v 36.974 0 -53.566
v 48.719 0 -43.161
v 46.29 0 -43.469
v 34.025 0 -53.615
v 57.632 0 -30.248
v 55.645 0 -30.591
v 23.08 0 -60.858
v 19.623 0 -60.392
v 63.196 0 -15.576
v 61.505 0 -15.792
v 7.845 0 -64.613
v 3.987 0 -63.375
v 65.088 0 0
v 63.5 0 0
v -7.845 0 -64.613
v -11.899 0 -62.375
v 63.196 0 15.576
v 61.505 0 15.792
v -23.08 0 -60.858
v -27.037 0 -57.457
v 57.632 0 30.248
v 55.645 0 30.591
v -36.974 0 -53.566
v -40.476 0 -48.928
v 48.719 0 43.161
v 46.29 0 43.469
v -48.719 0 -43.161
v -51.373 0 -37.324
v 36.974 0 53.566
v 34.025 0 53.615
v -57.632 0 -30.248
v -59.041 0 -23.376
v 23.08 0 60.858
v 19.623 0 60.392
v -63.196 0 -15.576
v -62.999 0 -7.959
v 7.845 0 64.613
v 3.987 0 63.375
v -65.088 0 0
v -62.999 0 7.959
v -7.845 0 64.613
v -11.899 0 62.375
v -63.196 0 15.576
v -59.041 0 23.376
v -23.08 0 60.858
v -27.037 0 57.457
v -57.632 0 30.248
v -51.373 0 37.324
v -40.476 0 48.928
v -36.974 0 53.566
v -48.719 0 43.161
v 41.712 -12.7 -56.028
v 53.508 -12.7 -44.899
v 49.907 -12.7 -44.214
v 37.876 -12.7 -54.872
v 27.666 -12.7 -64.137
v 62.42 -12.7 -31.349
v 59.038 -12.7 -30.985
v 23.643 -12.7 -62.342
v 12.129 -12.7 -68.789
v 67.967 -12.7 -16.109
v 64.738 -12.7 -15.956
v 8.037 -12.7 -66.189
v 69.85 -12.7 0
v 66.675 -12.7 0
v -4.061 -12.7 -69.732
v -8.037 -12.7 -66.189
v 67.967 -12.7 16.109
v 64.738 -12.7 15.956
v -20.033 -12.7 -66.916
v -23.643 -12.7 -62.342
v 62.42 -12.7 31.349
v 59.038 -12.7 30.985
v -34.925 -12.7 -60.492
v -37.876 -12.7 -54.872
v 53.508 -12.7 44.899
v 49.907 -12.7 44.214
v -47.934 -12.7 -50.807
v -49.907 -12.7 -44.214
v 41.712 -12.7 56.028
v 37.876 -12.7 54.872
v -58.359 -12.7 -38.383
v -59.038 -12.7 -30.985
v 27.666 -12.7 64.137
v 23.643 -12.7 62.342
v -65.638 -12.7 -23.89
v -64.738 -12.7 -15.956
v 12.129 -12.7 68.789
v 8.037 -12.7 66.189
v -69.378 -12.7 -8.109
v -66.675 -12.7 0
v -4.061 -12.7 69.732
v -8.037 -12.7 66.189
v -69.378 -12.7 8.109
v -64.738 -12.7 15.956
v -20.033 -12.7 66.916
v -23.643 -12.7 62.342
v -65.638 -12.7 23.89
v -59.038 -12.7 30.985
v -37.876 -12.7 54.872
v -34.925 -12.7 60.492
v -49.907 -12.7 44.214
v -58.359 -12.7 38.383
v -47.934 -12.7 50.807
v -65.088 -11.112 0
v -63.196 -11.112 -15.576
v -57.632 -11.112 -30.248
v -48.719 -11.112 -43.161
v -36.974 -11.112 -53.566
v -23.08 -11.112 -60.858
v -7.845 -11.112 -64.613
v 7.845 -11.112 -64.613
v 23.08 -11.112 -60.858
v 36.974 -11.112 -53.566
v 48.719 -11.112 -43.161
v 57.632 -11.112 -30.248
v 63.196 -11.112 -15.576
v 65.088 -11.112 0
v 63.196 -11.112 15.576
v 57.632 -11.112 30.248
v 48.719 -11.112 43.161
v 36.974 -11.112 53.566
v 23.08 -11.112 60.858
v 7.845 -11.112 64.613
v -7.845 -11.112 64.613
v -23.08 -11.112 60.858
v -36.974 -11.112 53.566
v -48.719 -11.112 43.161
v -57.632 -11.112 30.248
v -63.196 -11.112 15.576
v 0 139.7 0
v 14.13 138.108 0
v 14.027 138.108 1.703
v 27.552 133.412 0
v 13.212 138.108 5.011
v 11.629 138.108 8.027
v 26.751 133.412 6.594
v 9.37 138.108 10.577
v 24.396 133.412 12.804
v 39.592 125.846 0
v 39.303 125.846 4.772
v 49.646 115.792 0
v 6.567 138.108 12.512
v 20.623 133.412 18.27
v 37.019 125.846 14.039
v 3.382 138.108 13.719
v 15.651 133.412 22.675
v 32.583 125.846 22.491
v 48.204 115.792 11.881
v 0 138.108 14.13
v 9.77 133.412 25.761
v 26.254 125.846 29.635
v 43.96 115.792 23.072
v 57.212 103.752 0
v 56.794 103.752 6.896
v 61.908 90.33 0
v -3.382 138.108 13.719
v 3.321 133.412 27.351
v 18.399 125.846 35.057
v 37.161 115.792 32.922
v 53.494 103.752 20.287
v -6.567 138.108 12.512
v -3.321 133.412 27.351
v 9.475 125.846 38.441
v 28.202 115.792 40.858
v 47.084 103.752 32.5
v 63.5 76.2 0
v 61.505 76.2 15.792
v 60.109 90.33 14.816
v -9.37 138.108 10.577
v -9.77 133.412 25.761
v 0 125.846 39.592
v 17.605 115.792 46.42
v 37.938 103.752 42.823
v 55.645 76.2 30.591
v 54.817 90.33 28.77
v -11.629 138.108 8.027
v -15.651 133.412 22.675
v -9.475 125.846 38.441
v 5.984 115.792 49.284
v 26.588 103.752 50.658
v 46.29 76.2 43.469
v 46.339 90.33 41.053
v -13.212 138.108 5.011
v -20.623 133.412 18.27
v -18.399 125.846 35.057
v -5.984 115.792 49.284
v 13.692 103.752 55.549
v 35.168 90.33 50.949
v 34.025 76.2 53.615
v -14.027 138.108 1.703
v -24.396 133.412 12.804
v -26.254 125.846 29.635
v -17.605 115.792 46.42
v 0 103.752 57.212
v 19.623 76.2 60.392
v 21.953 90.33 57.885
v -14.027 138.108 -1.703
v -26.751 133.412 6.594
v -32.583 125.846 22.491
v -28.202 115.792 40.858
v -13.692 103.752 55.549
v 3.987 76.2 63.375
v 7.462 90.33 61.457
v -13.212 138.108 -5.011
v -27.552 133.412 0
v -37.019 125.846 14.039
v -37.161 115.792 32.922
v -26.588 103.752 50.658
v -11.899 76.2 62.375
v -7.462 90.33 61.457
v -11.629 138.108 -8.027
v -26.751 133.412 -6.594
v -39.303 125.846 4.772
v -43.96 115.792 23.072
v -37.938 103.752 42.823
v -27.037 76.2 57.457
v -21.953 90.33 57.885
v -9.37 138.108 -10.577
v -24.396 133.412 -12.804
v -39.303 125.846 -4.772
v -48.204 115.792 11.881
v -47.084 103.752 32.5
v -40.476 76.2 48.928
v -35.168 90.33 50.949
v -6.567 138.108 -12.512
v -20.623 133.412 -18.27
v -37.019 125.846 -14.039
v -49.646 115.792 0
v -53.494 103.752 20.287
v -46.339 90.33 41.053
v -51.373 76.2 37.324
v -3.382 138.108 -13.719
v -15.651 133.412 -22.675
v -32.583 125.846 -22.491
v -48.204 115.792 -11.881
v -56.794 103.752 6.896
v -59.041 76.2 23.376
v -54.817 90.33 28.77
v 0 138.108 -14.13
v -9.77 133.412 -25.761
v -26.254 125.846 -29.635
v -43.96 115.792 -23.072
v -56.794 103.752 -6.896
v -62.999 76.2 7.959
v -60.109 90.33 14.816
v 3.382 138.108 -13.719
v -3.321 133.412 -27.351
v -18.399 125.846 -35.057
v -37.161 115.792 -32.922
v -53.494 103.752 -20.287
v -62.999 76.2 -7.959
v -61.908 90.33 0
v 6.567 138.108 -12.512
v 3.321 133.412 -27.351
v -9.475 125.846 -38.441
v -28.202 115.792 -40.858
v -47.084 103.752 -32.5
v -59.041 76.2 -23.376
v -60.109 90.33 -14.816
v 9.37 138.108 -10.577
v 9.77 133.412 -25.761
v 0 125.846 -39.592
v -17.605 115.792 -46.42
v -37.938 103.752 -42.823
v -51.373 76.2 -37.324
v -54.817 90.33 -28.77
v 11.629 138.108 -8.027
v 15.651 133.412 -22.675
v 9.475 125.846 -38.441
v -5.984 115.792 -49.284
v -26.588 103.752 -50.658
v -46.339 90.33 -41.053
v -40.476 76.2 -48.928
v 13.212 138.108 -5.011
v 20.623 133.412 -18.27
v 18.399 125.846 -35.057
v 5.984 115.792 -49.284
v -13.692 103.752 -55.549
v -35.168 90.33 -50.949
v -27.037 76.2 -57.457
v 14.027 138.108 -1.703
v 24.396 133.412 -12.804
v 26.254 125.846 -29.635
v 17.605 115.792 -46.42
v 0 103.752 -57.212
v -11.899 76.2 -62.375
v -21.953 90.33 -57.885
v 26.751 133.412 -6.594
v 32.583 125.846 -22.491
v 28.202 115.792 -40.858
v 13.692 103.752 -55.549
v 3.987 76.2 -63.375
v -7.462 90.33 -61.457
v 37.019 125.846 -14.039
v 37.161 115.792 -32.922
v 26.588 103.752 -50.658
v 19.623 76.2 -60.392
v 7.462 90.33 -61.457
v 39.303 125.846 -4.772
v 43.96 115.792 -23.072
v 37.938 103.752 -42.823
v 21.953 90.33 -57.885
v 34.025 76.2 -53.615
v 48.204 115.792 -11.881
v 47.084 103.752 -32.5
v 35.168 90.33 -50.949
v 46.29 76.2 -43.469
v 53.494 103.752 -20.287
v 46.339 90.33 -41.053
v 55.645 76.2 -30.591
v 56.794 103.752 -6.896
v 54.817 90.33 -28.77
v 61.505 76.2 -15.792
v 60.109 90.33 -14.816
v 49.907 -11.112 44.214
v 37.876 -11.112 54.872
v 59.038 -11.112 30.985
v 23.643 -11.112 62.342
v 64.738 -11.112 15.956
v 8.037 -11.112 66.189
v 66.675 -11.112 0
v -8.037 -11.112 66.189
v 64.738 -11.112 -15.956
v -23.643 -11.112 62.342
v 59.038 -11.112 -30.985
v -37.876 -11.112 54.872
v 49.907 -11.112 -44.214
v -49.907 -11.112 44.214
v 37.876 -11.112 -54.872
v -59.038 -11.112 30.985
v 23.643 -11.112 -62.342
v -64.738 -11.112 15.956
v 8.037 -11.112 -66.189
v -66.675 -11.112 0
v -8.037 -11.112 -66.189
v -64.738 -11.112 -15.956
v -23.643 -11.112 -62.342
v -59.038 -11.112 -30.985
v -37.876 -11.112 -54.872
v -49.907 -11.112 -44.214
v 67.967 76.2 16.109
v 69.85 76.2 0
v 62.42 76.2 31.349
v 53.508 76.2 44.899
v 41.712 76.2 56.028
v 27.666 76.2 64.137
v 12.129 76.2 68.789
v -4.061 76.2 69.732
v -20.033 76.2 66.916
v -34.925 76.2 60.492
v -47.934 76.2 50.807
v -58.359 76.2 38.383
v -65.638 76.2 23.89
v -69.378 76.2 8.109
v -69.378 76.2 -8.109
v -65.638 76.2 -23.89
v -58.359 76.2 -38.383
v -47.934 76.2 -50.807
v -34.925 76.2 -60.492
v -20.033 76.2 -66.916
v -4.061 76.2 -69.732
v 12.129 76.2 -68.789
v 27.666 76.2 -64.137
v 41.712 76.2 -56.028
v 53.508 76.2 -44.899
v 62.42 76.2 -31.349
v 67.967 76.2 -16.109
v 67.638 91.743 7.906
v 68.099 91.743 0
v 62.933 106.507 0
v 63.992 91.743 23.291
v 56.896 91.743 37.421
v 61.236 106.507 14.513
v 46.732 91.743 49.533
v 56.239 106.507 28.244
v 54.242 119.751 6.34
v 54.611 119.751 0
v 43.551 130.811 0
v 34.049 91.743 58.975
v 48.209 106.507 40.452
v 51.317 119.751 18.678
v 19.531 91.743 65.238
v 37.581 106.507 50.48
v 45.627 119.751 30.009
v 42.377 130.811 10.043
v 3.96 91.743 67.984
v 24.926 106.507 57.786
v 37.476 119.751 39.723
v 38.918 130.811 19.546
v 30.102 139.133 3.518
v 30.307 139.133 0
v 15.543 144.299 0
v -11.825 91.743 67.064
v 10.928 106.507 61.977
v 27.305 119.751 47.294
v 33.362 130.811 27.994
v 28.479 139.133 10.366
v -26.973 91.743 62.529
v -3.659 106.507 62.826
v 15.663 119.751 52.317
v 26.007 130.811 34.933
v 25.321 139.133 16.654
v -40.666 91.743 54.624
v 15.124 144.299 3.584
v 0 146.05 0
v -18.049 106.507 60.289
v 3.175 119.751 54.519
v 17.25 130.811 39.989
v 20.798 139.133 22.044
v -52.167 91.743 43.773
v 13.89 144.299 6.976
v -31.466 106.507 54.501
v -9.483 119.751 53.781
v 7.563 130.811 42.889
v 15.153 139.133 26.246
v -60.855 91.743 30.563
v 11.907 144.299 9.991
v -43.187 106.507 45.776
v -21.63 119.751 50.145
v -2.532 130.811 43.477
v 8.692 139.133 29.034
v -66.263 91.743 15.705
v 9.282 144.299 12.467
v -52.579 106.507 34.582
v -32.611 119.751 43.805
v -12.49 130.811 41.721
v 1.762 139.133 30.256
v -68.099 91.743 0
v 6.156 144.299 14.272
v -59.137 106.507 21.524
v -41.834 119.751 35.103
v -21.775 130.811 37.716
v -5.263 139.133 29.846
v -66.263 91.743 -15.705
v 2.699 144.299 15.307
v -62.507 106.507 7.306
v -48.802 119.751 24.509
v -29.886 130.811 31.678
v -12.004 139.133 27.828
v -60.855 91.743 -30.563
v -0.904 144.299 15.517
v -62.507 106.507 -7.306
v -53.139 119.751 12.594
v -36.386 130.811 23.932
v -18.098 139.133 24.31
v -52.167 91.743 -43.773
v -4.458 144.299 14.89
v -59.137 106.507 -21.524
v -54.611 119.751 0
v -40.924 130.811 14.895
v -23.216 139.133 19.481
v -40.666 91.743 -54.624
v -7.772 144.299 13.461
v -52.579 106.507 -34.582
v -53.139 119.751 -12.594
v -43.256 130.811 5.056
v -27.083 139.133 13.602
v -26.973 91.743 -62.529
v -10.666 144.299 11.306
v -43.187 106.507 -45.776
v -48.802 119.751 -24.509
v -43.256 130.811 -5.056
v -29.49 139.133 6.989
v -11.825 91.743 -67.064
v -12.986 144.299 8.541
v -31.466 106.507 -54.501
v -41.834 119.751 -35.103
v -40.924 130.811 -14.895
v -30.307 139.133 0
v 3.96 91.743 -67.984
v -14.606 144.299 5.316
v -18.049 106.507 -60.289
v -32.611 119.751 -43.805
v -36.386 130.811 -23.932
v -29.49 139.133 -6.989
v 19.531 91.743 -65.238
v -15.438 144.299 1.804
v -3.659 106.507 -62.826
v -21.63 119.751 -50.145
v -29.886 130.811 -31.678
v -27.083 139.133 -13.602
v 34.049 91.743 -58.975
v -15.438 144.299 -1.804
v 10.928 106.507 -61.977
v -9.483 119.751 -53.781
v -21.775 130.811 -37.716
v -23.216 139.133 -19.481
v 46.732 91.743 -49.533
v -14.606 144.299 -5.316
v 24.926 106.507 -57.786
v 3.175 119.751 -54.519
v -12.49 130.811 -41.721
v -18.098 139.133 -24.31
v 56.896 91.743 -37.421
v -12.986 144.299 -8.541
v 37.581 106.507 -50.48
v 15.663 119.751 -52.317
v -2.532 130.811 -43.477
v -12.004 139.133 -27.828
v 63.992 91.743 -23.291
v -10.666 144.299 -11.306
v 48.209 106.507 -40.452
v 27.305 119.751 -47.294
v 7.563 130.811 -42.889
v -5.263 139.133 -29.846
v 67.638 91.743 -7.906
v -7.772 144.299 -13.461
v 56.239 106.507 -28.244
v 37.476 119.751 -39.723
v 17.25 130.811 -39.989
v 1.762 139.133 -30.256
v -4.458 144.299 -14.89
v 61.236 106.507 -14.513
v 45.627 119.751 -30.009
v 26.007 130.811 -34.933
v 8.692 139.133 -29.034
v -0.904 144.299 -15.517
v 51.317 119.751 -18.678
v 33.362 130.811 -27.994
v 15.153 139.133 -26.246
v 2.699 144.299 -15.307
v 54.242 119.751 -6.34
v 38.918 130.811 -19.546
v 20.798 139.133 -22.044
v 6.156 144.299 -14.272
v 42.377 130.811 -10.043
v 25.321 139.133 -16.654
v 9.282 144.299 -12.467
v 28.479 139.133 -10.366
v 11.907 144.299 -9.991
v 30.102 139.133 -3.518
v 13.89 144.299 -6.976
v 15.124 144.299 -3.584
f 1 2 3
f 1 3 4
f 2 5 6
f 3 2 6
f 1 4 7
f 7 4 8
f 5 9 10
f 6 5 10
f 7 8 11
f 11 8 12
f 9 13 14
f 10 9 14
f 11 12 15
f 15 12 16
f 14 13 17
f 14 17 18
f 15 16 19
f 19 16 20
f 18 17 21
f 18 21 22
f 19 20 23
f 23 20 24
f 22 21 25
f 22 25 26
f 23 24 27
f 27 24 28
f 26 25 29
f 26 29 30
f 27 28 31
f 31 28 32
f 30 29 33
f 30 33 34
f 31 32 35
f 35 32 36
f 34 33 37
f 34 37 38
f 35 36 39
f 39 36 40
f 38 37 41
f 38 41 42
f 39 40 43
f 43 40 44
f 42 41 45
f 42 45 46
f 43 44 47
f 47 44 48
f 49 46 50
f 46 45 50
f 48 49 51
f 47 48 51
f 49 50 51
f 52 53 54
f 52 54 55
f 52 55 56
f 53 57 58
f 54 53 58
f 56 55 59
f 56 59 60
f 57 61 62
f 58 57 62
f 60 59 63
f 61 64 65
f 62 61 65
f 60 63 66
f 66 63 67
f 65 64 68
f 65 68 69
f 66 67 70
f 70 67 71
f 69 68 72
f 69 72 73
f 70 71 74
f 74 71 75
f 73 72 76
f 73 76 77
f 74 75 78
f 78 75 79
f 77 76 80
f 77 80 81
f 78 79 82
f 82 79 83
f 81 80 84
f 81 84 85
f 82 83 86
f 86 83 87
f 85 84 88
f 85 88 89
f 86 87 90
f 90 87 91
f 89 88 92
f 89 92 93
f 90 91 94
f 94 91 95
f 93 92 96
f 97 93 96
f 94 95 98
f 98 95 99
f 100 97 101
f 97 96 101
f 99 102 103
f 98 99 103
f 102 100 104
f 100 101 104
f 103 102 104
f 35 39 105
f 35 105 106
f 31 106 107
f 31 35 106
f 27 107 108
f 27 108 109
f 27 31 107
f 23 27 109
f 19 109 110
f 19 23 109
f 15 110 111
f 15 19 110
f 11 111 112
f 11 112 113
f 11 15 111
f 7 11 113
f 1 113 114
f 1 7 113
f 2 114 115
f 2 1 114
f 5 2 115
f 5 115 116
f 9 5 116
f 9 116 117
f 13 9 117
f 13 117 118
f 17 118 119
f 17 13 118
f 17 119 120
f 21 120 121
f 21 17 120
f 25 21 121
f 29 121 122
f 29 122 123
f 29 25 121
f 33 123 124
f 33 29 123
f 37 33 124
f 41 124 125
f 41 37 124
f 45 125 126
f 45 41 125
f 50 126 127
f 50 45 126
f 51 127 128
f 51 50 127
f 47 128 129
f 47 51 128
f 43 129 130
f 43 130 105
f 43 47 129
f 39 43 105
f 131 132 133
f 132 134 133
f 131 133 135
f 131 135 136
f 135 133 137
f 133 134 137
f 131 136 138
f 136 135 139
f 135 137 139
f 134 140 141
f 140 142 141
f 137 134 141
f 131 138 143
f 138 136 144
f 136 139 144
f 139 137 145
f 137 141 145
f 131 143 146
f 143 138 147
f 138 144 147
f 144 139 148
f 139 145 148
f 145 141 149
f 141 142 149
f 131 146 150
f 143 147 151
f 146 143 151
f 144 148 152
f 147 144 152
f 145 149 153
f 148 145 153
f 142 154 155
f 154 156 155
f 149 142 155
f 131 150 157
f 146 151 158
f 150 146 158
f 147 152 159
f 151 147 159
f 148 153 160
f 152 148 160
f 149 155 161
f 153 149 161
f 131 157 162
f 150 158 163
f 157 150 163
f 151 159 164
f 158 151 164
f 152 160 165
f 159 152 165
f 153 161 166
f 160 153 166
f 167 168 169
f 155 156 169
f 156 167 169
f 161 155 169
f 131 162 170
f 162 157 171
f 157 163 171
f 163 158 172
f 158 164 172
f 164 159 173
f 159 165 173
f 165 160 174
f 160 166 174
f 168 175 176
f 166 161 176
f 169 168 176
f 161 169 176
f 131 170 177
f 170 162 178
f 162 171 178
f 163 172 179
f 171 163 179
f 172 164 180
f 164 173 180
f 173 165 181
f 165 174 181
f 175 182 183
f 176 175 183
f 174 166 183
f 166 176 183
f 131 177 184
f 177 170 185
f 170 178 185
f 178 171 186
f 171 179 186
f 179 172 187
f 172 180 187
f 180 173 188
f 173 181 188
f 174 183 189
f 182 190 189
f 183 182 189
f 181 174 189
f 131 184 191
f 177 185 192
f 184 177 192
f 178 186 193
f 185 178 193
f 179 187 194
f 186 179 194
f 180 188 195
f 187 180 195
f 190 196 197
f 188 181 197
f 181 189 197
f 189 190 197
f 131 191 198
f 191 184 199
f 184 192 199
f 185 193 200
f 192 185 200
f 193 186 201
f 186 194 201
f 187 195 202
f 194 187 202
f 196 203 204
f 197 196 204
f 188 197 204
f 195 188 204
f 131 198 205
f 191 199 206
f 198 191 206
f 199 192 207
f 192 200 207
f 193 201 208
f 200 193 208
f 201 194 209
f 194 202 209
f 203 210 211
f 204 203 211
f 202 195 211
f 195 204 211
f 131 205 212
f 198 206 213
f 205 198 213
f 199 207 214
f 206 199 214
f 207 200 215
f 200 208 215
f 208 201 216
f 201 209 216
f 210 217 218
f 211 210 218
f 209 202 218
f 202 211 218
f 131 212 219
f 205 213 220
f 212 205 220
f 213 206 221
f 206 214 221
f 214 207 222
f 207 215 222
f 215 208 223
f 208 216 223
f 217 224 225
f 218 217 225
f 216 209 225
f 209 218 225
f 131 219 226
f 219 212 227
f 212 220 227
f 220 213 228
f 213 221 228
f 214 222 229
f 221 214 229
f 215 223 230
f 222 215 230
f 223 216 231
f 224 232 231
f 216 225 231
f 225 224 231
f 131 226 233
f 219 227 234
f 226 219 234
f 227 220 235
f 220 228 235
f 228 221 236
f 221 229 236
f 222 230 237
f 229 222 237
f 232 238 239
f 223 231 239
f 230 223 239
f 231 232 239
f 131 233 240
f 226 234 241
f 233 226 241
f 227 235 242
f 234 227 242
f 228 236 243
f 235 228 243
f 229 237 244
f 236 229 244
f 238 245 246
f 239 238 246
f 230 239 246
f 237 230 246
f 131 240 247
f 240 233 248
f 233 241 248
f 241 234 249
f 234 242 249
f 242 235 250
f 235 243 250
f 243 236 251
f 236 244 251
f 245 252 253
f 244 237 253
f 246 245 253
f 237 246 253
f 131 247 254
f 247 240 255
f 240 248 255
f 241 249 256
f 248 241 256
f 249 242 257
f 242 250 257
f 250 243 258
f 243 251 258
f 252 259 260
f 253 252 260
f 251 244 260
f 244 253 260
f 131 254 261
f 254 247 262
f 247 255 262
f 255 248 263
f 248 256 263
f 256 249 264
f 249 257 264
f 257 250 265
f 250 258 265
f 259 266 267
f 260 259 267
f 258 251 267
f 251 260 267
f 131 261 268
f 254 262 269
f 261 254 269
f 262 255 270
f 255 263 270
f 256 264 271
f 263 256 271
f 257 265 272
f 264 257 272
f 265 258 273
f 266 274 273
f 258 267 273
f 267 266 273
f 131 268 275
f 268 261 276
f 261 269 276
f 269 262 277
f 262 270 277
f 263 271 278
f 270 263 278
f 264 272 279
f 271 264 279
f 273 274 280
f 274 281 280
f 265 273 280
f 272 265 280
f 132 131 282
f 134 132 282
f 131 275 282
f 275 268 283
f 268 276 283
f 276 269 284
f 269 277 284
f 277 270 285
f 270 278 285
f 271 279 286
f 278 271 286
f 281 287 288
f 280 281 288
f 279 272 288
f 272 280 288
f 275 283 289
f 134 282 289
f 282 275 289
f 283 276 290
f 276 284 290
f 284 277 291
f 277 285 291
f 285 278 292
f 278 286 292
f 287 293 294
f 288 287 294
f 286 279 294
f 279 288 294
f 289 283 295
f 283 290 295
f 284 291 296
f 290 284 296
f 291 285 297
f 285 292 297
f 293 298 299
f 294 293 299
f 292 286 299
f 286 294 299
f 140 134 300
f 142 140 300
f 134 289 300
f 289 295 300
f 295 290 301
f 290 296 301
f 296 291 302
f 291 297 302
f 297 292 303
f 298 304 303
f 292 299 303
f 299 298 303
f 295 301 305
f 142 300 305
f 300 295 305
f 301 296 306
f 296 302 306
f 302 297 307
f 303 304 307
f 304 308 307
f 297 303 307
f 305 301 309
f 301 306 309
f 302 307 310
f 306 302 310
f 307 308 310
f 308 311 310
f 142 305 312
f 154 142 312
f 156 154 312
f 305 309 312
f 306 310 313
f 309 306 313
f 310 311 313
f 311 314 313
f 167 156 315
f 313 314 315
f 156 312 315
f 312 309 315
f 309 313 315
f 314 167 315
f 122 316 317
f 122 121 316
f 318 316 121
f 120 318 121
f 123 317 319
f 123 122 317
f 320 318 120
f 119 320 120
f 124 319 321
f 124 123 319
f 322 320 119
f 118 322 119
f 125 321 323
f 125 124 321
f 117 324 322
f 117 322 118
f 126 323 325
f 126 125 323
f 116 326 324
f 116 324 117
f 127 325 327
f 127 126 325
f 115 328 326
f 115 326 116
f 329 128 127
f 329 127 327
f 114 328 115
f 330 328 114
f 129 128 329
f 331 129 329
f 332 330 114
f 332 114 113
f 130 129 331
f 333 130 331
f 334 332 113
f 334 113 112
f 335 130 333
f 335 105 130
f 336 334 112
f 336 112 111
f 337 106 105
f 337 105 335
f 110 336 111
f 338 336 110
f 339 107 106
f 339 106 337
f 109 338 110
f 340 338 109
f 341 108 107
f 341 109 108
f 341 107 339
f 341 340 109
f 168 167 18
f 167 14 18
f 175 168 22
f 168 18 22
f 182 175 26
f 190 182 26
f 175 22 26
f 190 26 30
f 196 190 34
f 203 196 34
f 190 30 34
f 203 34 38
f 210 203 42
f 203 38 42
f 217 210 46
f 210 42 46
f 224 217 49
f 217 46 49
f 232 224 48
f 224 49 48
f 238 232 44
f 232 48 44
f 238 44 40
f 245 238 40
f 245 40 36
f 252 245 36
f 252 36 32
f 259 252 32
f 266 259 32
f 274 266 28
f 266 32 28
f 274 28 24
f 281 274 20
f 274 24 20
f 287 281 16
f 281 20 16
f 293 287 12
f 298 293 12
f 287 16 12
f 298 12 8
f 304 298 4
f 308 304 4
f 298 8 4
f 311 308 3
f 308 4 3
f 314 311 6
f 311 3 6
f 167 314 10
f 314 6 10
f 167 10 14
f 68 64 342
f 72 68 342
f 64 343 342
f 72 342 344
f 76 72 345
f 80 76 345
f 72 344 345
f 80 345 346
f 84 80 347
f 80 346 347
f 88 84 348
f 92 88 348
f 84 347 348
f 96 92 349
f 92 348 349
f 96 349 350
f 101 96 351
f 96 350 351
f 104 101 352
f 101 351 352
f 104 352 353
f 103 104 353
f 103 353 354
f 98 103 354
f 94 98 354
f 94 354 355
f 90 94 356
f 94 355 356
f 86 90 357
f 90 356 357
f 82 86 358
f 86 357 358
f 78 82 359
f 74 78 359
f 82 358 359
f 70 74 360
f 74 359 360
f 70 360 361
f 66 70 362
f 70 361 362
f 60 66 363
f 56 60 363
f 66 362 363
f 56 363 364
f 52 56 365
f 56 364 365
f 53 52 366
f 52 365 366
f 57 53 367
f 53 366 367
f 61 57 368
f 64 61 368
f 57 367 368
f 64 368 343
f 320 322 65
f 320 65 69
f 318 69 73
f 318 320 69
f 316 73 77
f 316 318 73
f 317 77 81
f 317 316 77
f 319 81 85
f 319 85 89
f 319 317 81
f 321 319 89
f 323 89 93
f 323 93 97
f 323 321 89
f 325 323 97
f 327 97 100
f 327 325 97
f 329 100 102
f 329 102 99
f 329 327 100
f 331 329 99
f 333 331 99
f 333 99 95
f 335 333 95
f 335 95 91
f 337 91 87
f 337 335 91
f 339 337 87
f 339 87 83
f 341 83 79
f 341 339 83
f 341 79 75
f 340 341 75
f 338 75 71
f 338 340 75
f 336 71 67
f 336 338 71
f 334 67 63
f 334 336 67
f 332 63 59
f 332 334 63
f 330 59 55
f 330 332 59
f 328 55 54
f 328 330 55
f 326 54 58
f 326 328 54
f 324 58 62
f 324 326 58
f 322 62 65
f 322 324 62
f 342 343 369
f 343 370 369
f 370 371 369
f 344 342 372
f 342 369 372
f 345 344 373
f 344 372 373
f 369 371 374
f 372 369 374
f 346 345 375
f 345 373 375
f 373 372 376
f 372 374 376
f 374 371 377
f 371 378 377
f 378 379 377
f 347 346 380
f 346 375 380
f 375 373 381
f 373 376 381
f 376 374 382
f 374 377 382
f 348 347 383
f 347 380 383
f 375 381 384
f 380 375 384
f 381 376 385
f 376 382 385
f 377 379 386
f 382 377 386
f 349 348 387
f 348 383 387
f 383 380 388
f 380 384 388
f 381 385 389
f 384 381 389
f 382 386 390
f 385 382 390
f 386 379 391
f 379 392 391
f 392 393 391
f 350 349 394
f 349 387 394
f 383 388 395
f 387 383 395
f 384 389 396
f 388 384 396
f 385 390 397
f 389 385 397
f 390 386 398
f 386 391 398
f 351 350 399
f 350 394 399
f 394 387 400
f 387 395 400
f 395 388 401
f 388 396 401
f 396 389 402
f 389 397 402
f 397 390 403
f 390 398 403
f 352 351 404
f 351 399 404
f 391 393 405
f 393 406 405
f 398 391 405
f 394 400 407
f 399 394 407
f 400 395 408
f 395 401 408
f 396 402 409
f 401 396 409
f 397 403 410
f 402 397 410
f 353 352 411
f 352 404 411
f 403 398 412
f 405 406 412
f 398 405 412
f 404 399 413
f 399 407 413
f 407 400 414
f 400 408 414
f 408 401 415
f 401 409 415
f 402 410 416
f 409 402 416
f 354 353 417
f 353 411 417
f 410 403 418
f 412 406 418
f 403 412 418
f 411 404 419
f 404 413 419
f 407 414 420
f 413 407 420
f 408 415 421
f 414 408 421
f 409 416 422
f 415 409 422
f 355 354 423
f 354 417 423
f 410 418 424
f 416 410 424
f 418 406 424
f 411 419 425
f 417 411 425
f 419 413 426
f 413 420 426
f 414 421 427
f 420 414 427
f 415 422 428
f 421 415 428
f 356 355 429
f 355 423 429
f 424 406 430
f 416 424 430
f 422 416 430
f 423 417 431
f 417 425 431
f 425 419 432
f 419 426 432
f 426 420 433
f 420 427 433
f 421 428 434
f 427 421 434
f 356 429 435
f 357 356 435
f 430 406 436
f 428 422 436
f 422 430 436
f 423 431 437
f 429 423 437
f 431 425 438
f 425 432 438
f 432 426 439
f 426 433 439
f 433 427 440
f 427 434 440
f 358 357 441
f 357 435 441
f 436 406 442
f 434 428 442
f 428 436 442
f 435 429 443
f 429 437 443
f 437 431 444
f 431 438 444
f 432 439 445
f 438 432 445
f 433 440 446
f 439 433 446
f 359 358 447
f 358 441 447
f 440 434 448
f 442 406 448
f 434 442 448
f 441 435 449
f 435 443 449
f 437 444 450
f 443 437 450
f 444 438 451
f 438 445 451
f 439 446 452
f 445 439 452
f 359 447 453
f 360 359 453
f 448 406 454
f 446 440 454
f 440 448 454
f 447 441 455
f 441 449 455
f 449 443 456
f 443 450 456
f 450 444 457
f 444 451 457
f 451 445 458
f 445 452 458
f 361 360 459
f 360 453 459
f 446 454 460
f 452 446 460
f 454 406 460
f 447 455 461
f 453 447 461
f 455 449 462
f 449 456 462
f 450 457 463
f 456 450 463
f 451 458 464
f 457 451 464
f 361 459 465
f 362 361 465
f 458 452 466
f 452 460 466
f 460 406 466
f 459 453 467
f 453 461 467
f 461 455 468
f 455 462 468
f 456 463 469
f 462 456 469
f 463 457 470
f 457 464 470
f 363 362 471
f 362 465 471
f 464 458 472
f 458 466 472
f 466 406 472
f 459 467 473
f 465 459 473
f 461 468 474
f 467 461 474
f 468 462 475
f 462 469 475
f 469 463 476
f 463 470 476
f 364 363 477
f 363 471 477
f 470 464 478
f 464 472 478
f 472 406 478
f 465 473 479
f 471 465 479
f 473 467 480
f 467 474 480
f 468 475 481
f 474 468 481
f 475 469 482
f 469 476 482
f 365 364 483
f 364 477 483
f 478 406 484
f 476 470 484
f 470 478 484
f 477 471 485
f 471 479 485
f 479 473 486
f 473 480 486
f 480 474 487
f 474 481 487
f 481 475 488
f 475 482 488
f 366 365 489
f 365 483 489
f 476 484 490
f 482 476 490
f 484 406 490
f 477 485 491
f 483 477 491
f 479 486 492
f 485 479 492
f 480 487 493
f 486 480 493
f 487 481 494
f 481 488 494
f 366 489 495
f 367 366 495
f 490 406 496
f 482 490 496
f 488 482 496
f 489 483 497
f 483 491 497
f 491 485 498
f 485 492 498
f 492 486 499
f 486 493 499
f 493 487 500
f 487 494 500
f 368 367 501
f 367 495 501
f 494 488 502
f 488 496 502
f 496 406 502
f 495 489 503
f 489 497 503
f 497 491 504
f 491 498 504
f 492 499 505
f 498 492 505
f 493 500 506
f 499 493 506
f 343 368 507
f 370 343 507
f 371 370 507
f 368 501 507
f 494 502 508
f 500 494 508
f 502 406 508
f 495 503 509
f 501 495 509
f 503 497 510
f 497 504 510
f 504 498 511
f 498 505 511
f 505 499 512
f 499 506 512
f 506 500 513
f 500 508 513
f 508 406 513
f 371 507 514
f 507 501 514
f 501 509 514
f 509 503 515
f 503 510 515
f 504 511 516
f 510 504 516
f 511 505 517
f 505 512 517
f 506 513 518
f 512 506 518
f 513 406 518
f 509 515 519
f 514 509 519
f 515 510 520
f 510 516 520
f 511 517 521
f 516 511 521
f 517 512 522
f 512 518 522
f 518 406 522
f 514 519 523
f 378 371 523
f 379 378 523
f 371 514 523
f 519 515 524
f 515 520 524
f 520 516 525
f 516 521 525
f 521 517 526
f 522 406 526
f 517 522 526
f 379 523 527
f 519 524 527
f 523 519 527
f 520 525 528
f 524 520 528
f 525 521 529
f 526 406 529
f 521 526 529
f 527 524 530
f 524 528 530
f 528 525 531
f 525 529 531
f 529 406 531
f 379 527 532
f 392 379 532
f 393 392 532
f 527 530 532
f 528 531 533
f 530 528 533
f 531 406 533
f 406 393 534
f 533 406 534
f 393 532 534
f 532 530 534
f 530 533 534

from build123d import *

# Parameters (mm, degrees)
SKETCH1_W           = 3.175
SKETCH1_H           = 12.7
SKETCH2_R           = 66.675
SKETCH2_R_2         = 65.0875
BOSS_EXTRUDE1_DEPTH = 11.1125


with BuildPart() as part:
    # Sketch1 → Revolve3 (revolve)
    with BuildSketch(Plane.XY):
        with BuildLine():
            Line((69.85, 0), (69.85, 76.2))
            ThreePointArc((69.85, 76.2), (49.391408666, 125.591408666), (0, 146.05))
            Line((0, 146.05), (0, 139.7))
            ThreePointArc((0, 139.7), (44.901280605, 121.101280605), (63.5, 76.2))
            Line((63.5, 76.2), (63.5, 0))
            Line((63.5, 0), (69.85, 0))
        make_face()
        with Locations((68.2625, -6.35)):
            Rectangle(SKETCH1_W, SKETCH1_H)
    revolve(axis=Axis((0, 146.05, 0), (0, -1, 0)))

    # Sketch2 → Boss-Extrude1 (add)
    with BuildSketch(Plane(origin=(0, 0, 0), x_dir=(-1, 0, 0), z_dir=(0, -1, 0))):
        Circle(SKETCH2_R)
        Circle(SKETCH2_R_2, mode=Mode.SUBTRACT)
    extrude(amount=BOSS_EXTRUDE1_DEPTH)


solid = part.part
